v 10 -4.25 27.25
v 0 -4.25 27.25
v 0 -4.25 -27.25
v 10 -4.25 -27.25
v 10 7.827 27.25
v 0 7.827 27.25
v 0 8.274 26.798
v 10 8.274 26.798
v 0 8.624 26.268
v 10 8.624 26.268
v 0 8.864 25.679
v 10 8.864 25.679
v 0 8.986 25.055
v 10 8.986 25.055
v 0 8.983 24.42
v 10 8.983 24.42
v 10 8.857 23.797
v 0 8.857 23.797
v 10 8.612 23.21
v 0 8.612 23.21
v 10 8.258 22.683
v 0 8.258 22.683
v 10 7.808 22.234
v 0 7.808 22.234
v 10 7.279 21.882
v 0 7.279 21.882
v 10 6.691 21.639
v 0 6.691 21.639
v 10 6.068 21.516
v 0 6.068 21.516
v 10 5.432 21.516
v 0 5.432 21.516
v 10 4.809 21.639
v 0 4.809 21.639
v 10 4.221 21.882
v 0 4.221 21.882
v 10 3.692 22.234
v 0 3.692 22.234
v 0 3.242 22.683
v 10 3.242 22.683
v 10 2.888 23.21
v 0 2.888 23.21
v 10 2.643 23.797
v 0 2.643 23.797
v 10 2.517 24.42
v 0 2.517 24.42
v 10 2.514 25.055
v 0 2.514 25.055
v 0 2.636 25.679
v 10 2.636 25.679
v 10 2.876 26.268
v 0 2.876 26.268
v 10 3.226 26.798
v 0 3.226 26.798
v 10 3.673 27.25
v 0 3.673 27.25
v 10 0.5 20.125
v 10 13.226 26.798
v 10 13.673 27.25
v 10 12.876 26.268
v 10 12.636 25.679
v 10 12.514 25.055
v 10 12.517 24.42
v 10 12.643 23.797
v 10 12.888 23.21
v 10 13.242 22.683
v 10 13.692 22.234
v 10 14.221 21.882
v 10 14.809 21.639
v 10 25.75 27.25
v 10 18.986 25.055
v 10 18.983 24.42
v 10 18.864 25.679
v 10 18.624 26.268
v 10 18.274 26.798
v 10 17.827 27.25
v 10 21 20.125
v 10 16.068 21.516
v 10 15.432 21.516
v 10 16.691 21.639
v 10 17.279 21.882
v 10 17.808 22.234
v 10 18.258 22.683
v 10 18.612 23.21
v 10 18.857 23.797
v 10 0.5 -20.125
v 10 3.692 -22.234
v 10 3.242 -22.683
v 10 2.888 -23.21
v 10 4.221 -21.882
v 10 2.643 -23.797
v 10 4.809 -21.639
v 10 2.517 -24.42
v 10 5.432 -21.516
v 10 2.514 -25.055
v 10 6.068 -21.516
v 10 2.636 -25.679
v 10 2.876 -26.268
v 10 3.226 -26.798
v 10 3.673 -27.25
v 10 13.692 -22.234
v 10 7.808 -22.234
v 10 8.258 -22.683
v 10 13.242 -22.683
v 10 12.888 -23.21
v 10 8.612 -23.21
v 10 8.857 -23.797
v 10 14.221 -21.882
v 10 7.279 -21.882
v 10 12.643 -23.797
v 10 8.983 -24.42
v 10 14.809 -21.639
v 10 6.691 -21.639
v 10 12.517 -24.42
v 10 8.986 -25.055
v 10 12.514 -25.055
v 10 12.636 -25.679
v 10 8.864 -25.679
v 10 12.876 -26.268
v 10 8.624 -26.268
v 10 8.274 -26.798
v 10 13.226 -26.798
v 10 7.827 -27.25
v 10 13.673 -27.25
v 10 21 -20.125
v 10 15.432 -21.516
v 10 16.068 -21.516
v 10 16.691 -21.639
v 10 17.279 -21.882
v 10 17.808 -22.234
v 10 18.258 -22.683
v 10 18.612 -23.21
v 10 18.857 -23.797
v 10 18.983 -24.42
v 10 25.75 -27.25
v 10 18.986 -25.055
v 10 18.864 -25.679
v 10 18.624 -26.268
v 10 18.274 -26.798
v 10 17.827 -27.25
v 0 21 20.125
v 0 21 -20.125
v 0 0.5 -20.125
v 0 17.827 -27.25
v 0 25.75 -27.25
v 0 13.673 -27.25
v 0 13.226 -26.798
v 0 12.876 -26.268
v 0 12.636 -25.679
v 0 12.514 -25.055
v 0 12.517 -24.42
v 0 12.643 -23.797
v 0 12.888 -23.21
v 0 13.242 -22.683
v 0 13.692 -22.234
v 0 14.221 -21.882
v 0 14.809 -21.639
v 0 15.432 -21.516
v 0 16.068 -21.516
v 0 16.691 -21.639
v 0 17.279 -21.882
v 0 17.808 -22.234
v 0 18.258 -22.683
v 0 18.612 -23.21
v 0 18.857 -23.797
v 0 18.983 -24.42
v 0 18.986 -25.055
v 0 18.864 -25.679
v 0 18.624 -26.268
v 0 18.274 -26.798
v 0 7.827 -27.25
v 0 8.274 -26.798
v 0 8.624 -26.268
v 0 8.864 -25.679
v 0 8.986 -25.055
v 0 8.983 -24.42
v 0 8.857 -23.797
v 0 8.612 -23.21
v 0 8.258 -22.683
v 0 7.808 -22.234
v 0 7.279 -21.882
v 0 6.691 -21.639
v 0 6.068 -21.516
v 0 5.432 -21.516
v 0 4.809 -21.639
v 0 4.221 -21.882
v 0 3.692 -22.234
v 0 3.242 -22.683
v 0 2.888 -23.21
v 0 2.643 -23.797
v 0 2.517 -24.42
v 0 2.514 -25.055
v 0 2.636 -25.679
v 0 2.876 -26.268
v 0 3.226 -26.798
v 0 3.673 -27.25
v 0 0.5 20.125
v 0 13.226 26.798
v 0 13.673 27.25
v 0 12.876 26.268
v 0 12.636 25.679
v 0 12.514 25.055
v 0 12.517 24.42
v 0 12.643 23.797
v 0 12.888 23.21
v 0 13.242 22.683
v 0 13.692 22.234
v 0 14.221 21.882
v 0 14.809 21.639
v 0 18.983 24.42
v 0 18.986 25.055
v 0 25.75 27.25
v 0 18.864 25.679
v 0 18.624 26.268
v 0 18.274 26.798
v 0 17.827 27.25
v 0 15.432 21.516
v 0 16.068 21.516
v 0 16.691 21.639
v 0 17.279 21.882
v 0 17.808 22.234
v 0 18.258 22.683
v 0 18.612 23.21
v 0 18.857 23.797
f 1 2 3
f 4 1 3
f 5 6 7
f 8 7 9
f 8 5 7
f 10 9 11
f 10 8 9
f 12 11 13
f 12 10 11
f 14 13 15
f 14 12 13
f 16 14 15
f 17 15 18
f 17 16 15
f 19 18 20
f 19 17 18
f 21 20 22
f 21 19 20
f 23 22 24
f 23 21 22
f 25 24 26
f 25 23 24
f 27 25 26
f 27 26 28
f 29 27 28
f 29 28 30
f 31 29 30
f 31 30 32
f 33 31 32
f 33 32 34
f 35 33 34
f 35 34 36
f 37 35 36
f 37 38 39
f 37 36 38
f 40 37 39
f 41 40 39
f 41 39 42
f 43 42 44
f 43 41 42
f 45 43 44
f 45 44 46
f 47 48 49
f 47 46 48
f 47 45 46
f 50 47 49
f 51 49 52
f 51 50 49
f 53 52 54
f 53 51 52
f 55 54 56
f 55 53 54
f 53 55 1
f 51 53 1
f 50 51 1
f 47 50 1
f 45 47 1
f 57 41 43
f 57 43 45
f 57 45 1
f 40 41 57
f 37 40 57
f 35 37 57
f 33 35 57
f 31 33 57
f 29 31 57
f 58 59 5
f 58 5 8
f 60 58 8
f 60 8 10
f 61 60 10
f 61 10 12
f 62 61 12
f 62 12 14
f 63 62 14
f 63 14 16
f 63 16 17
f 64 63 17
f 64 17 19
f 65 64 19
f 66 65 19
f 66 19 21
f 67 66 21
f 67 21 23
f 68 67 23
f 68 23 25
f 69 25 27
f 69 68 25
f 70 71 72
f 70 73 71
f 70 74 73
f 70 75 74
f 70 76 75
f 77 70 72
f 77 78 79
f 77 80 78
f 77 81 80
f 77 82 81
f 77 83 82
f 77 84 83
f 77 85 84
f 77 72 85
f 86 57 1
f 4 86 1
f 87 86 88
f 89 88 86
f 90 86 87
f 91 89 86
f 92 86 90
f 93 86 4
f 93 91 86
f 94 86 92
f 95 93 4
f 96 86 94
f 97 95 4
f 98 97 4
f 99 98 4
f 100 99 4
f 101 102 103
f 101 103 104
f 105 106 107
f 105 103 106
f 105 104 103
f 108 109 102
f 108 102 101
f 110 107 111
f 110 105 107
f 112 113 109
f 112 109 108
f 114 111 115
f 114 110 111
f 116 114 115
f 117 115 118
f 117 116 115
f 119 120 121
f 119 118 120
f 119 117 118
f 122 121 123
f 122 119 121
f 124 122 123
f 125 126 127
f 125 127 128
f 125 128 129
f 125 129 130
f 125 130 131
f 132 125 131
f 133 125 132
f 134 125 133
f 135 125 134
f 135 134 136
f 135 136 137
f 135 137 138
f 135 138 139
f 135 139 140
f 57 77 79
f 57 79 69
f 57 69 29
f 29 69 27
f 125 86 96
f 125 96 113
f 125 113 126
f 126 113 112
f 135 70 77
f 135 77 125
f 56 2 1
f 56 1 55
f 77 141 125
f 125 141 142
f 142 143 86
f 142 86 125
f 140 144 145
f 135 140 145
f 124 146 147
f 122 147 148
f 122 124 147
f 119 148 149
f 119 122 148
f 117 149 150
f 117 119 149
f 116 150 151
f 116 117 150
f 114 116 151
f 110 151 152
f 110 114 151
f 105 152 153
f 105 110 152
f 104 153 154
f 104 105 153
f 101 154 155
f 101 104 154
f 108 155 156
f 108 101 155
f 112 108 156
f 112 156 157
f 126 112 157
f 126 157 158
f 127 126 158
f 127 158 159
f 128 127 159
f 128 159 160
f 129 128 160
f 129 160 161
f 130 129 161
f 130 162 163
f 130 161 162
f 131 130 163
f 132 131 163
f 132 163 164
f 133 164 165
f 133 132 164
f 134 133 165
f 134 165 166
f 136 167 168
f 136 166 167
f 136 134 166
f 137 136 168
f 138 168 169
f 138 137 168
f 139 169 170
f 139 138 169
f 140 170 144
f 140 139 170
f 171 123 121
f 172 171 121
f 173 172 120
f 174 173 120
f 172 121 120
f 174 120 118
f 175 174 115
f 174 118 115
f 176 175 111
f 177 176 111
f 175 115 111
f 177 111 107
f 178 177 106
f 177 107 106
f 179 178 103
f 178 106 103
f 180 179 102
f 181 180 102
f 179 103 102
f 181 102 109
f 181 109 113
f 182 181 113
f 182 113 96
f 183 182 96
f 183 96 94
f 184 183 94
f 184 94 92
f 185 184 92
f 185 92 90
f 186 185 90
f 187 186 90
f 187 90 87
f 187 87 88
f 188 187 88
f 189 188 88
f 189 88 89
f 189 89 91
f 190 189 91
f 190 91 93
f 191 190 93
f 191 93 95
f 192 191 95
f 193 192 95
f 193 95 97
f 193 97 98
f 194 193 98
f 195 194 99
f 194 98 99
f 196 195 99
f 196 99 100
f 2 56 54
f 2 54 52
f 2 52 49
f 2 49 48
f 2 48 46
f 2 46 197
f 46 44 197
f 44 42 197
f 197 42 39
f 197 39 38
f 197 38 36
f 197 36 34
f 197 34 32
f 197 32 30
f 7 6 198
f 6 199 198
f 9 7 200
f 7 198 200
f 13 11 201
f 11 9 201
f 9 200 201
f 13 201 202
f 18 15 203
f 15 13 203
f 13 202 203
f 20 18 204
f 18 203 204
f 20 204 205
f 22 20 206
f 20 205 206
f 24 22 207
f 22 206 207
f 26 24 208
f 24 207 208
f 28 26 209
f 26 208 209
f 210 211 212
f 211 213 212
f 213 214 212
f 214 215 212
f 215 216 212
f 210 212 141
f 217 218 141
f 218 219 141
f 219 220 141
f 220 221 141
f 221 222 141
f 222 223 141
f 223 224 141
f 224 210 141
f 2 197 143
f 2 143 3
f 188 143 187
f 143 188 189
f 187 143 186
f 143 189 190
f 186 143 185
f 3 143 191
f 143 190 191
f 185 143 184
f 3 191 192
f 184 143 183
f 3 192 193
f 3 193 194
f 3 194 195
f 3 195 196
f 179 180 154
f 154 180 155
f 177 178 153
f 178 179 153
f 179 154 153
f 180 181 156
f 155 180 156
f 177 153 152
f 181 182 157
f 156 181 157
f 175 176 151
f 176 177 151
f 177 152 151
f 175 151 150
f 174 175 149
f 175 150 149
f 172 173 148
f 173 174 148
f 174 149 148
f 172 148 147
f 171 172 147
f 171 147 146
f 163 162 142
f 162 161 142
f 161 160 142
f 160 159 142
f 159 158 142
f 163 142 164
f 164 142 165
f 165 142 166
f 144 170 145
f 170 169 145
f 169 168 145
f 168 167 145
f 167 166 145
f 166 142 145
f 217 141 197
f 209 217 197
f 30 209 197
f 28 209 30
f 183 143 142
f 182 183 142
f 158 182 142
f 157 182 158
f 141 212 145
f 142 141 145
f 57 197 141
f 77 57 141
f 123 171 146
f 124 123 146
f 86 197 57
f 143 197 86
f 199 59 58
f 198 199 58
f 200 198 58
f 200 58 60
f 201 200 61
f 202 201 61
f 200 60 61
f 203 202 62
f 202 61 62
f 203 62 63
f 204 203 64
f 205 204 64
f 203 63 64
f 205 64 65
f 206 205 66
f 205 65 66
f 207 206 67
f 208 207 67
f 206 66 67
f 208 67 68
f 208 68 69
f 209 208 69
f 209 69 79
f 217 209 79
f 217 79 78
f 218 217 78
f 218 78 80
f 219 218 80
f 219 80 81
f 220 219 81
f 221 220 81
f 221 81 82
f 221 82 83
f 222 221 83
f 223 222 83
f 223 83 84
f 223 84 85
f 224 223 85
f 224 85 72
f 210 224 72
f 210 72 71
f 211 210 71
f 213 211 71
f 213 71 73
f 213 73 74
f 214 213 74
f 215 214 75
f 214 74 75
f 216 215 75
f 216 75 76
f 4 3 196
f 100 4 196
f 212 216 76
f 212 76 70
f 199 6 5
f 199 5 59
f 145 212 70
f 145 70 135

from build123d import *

# Parameters (mm, degrees)
SKETCH1_W           = 54.5
SKETCH1_H           = 30
SKETCH1_W_2         = 40.25
SKETCH1_H_2         = 20.5
BOSS_EXTRUDE1_DEPTH = 10
CUT_EXTRUDE1_DEPTH  = 20


with BuildPart() as part:
    # Sketch1 → Boss-Extrude1 (new body)
    with BuildSketch(Plane(origin=(0, 0, 0), x_dir=(0, 0, -1), z_dir=(1, 0, 0))):
        with Locations((0, 10.75)):
            Rectangle(SKETCH1_W, SKETCH1_H)
        with Locations((0, 10.75)):
            Rectangle(SKETCH1_W_2, SKETCH1_H_2, mode=Mode.SUBTRACT)
    extrude(amount=BOSS_EXTRUDE1_DEPTH)

    # Sketch3 → Cut-Extrude1 (cut)
    with BuildSketch(Plane(origin=(10, 0, 0), x_dir=(0, 0, -1), z_dir=(1, 0, 0))):
        with BuildLine():
            Line((-27.25, 17.826655966), (-27.25, 13.673344034))
            ThreePointArc((-27.25, 13.673344034), (-21.5, 15.75), (-27.25, 17.826655966))
        make_face()
        with BuildLine():
            Line((27.25, 17.826655966), (27.25, 13.673344034))
            ThreePointArc((27.25, 13.673344034), (21.5, 15.75), (27.25, 17.826655966))
        make_face()
        with BuildLine():
            Line((27.25, 3.673344034), (27.25, 7.826655966))
            ThreePointArc((27.25, 7.826655966), (21.5, 5.75), (27.25, 3.673344034))
        make_face()
        with BuildLine():
            Line((-27.25, 3.673344034), (-27.25, 7.826655966))
            ThreePointArc((-27.25, 7.826655966), (-21.5, 5.75), (-27.25, 3.673344034))
        make_face()
    extrude(amount=-CUT_EXTRUDE1_DEPTH, mode=Mode.SUBTRACT)


solid = part.part
